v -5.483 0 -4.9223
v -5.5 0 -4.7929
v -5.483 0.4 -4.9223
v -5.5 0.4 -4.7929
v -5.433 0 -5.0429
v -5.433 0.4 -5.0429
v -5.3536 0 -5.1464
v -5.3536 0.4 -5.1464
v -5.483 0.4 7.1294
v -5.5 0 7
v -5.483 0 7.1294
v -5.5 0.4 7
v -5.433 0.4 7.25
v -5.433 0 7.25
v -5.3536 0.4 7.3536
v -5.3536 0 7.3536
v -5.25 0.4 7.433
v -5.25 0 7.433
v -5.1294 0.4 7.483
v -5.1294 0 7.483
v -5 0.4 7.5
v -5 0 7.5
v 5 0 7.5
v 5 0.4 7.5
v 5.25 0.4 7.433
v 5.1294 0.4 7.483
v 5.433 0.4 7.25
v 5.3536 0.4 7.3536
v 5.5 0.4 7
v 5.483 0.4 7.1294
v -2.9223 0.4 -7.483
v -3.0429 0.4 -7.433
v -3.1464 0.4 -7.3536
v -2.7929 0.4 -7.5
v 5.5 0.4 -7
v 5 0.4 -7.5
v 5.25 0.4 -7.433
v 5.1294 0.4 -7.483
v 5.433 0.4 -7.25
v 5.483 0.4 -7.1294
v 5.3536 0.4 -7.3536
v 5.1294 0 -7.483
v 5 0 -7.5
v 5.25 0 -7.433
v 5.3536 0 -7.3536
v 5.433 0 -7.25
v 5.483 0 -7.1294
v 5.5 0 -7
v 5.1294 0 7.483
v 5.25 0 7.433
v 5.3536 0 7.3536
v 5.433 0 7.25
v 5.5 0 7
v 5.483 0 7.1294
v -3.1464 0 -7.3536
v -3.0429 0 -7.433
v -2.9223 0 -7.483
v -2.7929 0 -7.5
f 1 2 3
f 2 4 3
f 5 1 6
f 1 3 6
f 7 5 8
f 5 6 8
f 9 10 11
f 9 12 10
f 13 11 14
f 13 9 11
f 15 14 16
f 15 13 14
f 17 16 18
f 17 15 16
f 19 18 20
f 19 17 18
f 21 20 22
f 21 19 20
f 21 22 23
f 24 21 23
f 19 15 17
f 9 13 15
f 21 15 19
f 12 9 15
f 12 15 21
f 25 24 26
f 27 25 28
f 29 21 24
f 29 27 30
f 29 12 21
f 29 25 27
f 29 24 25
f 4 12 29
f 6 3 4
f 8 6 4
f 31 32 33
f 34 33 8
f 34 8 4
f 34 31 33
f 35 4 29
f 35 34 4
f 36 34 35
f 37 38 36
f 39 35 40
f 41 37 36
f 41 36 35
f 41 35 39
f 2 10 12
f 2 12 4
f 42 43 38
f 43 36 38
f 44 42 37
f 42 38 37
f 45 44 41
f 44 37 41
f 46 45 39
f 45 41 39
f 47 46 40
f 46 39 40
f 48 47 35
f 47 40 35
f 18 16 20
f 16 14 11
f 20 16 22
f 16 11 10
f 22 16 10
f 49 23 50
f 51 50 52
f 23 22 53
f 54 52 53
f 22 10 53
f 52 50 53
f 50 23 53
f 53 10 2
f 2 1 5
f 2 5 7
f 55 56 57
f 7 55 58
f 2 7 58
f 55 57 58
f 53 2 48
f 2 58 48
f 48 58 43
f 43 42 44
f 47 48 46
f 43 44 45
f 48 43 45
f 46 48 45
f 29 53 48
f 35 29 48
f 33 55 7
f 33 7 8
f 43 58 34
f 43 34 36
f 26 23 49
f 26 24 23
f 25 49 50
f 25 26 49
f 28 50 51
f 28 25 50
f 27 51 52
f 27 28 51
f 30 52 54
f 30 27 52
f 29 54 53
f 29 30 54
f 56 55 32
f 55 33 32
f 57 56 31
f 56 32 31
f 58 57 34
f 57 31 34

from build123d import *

# Parameters (mm, degrees)
SKETCH1_W           = 11
SKETCH1_H           = 15
BOSS_EXTRUDE1_DEPTH = 0.4
CHAMFER1_SIZE       = 2.5
FILLET1_R           = 0.5


with BuildPart() as part:
    # Sketch1 → Boss-Extrude1 (new body)
    with BuildSketch(Plane(origin=(0, 0, 0), x_dir=(1, 0, 0), z_dir=(0, 1, 0))):
        Rectangle(SKETCH1_W, SKETCH1_H)
    extrude(amount=BOSS_EXTRUDE1_DEPTH)

    # Chamfer1
    chamfer1_edges = [part.edges().sort_by_distance(p)[0] for p in [
        (-5.5, 0.2, -7.5),
    ]]
    chamfer(chamfer1_edges, length=CHAMFER1_SIZE)

    # Fillet1
    fillet1_edges = [part.edges().sort_by_distance(p)[0] for p in [
        (-5.5, 0.2, -5),
        (-3, 0.2, -7.5),
        (5.5, 0.2, 7.5),
        (-5.5, 0.2, 7.5),
        (5.5, 0.2, -7.5),
    ]]
    fillet(fillet1_edges, radius=FILLET1_R)


solid = part.part
